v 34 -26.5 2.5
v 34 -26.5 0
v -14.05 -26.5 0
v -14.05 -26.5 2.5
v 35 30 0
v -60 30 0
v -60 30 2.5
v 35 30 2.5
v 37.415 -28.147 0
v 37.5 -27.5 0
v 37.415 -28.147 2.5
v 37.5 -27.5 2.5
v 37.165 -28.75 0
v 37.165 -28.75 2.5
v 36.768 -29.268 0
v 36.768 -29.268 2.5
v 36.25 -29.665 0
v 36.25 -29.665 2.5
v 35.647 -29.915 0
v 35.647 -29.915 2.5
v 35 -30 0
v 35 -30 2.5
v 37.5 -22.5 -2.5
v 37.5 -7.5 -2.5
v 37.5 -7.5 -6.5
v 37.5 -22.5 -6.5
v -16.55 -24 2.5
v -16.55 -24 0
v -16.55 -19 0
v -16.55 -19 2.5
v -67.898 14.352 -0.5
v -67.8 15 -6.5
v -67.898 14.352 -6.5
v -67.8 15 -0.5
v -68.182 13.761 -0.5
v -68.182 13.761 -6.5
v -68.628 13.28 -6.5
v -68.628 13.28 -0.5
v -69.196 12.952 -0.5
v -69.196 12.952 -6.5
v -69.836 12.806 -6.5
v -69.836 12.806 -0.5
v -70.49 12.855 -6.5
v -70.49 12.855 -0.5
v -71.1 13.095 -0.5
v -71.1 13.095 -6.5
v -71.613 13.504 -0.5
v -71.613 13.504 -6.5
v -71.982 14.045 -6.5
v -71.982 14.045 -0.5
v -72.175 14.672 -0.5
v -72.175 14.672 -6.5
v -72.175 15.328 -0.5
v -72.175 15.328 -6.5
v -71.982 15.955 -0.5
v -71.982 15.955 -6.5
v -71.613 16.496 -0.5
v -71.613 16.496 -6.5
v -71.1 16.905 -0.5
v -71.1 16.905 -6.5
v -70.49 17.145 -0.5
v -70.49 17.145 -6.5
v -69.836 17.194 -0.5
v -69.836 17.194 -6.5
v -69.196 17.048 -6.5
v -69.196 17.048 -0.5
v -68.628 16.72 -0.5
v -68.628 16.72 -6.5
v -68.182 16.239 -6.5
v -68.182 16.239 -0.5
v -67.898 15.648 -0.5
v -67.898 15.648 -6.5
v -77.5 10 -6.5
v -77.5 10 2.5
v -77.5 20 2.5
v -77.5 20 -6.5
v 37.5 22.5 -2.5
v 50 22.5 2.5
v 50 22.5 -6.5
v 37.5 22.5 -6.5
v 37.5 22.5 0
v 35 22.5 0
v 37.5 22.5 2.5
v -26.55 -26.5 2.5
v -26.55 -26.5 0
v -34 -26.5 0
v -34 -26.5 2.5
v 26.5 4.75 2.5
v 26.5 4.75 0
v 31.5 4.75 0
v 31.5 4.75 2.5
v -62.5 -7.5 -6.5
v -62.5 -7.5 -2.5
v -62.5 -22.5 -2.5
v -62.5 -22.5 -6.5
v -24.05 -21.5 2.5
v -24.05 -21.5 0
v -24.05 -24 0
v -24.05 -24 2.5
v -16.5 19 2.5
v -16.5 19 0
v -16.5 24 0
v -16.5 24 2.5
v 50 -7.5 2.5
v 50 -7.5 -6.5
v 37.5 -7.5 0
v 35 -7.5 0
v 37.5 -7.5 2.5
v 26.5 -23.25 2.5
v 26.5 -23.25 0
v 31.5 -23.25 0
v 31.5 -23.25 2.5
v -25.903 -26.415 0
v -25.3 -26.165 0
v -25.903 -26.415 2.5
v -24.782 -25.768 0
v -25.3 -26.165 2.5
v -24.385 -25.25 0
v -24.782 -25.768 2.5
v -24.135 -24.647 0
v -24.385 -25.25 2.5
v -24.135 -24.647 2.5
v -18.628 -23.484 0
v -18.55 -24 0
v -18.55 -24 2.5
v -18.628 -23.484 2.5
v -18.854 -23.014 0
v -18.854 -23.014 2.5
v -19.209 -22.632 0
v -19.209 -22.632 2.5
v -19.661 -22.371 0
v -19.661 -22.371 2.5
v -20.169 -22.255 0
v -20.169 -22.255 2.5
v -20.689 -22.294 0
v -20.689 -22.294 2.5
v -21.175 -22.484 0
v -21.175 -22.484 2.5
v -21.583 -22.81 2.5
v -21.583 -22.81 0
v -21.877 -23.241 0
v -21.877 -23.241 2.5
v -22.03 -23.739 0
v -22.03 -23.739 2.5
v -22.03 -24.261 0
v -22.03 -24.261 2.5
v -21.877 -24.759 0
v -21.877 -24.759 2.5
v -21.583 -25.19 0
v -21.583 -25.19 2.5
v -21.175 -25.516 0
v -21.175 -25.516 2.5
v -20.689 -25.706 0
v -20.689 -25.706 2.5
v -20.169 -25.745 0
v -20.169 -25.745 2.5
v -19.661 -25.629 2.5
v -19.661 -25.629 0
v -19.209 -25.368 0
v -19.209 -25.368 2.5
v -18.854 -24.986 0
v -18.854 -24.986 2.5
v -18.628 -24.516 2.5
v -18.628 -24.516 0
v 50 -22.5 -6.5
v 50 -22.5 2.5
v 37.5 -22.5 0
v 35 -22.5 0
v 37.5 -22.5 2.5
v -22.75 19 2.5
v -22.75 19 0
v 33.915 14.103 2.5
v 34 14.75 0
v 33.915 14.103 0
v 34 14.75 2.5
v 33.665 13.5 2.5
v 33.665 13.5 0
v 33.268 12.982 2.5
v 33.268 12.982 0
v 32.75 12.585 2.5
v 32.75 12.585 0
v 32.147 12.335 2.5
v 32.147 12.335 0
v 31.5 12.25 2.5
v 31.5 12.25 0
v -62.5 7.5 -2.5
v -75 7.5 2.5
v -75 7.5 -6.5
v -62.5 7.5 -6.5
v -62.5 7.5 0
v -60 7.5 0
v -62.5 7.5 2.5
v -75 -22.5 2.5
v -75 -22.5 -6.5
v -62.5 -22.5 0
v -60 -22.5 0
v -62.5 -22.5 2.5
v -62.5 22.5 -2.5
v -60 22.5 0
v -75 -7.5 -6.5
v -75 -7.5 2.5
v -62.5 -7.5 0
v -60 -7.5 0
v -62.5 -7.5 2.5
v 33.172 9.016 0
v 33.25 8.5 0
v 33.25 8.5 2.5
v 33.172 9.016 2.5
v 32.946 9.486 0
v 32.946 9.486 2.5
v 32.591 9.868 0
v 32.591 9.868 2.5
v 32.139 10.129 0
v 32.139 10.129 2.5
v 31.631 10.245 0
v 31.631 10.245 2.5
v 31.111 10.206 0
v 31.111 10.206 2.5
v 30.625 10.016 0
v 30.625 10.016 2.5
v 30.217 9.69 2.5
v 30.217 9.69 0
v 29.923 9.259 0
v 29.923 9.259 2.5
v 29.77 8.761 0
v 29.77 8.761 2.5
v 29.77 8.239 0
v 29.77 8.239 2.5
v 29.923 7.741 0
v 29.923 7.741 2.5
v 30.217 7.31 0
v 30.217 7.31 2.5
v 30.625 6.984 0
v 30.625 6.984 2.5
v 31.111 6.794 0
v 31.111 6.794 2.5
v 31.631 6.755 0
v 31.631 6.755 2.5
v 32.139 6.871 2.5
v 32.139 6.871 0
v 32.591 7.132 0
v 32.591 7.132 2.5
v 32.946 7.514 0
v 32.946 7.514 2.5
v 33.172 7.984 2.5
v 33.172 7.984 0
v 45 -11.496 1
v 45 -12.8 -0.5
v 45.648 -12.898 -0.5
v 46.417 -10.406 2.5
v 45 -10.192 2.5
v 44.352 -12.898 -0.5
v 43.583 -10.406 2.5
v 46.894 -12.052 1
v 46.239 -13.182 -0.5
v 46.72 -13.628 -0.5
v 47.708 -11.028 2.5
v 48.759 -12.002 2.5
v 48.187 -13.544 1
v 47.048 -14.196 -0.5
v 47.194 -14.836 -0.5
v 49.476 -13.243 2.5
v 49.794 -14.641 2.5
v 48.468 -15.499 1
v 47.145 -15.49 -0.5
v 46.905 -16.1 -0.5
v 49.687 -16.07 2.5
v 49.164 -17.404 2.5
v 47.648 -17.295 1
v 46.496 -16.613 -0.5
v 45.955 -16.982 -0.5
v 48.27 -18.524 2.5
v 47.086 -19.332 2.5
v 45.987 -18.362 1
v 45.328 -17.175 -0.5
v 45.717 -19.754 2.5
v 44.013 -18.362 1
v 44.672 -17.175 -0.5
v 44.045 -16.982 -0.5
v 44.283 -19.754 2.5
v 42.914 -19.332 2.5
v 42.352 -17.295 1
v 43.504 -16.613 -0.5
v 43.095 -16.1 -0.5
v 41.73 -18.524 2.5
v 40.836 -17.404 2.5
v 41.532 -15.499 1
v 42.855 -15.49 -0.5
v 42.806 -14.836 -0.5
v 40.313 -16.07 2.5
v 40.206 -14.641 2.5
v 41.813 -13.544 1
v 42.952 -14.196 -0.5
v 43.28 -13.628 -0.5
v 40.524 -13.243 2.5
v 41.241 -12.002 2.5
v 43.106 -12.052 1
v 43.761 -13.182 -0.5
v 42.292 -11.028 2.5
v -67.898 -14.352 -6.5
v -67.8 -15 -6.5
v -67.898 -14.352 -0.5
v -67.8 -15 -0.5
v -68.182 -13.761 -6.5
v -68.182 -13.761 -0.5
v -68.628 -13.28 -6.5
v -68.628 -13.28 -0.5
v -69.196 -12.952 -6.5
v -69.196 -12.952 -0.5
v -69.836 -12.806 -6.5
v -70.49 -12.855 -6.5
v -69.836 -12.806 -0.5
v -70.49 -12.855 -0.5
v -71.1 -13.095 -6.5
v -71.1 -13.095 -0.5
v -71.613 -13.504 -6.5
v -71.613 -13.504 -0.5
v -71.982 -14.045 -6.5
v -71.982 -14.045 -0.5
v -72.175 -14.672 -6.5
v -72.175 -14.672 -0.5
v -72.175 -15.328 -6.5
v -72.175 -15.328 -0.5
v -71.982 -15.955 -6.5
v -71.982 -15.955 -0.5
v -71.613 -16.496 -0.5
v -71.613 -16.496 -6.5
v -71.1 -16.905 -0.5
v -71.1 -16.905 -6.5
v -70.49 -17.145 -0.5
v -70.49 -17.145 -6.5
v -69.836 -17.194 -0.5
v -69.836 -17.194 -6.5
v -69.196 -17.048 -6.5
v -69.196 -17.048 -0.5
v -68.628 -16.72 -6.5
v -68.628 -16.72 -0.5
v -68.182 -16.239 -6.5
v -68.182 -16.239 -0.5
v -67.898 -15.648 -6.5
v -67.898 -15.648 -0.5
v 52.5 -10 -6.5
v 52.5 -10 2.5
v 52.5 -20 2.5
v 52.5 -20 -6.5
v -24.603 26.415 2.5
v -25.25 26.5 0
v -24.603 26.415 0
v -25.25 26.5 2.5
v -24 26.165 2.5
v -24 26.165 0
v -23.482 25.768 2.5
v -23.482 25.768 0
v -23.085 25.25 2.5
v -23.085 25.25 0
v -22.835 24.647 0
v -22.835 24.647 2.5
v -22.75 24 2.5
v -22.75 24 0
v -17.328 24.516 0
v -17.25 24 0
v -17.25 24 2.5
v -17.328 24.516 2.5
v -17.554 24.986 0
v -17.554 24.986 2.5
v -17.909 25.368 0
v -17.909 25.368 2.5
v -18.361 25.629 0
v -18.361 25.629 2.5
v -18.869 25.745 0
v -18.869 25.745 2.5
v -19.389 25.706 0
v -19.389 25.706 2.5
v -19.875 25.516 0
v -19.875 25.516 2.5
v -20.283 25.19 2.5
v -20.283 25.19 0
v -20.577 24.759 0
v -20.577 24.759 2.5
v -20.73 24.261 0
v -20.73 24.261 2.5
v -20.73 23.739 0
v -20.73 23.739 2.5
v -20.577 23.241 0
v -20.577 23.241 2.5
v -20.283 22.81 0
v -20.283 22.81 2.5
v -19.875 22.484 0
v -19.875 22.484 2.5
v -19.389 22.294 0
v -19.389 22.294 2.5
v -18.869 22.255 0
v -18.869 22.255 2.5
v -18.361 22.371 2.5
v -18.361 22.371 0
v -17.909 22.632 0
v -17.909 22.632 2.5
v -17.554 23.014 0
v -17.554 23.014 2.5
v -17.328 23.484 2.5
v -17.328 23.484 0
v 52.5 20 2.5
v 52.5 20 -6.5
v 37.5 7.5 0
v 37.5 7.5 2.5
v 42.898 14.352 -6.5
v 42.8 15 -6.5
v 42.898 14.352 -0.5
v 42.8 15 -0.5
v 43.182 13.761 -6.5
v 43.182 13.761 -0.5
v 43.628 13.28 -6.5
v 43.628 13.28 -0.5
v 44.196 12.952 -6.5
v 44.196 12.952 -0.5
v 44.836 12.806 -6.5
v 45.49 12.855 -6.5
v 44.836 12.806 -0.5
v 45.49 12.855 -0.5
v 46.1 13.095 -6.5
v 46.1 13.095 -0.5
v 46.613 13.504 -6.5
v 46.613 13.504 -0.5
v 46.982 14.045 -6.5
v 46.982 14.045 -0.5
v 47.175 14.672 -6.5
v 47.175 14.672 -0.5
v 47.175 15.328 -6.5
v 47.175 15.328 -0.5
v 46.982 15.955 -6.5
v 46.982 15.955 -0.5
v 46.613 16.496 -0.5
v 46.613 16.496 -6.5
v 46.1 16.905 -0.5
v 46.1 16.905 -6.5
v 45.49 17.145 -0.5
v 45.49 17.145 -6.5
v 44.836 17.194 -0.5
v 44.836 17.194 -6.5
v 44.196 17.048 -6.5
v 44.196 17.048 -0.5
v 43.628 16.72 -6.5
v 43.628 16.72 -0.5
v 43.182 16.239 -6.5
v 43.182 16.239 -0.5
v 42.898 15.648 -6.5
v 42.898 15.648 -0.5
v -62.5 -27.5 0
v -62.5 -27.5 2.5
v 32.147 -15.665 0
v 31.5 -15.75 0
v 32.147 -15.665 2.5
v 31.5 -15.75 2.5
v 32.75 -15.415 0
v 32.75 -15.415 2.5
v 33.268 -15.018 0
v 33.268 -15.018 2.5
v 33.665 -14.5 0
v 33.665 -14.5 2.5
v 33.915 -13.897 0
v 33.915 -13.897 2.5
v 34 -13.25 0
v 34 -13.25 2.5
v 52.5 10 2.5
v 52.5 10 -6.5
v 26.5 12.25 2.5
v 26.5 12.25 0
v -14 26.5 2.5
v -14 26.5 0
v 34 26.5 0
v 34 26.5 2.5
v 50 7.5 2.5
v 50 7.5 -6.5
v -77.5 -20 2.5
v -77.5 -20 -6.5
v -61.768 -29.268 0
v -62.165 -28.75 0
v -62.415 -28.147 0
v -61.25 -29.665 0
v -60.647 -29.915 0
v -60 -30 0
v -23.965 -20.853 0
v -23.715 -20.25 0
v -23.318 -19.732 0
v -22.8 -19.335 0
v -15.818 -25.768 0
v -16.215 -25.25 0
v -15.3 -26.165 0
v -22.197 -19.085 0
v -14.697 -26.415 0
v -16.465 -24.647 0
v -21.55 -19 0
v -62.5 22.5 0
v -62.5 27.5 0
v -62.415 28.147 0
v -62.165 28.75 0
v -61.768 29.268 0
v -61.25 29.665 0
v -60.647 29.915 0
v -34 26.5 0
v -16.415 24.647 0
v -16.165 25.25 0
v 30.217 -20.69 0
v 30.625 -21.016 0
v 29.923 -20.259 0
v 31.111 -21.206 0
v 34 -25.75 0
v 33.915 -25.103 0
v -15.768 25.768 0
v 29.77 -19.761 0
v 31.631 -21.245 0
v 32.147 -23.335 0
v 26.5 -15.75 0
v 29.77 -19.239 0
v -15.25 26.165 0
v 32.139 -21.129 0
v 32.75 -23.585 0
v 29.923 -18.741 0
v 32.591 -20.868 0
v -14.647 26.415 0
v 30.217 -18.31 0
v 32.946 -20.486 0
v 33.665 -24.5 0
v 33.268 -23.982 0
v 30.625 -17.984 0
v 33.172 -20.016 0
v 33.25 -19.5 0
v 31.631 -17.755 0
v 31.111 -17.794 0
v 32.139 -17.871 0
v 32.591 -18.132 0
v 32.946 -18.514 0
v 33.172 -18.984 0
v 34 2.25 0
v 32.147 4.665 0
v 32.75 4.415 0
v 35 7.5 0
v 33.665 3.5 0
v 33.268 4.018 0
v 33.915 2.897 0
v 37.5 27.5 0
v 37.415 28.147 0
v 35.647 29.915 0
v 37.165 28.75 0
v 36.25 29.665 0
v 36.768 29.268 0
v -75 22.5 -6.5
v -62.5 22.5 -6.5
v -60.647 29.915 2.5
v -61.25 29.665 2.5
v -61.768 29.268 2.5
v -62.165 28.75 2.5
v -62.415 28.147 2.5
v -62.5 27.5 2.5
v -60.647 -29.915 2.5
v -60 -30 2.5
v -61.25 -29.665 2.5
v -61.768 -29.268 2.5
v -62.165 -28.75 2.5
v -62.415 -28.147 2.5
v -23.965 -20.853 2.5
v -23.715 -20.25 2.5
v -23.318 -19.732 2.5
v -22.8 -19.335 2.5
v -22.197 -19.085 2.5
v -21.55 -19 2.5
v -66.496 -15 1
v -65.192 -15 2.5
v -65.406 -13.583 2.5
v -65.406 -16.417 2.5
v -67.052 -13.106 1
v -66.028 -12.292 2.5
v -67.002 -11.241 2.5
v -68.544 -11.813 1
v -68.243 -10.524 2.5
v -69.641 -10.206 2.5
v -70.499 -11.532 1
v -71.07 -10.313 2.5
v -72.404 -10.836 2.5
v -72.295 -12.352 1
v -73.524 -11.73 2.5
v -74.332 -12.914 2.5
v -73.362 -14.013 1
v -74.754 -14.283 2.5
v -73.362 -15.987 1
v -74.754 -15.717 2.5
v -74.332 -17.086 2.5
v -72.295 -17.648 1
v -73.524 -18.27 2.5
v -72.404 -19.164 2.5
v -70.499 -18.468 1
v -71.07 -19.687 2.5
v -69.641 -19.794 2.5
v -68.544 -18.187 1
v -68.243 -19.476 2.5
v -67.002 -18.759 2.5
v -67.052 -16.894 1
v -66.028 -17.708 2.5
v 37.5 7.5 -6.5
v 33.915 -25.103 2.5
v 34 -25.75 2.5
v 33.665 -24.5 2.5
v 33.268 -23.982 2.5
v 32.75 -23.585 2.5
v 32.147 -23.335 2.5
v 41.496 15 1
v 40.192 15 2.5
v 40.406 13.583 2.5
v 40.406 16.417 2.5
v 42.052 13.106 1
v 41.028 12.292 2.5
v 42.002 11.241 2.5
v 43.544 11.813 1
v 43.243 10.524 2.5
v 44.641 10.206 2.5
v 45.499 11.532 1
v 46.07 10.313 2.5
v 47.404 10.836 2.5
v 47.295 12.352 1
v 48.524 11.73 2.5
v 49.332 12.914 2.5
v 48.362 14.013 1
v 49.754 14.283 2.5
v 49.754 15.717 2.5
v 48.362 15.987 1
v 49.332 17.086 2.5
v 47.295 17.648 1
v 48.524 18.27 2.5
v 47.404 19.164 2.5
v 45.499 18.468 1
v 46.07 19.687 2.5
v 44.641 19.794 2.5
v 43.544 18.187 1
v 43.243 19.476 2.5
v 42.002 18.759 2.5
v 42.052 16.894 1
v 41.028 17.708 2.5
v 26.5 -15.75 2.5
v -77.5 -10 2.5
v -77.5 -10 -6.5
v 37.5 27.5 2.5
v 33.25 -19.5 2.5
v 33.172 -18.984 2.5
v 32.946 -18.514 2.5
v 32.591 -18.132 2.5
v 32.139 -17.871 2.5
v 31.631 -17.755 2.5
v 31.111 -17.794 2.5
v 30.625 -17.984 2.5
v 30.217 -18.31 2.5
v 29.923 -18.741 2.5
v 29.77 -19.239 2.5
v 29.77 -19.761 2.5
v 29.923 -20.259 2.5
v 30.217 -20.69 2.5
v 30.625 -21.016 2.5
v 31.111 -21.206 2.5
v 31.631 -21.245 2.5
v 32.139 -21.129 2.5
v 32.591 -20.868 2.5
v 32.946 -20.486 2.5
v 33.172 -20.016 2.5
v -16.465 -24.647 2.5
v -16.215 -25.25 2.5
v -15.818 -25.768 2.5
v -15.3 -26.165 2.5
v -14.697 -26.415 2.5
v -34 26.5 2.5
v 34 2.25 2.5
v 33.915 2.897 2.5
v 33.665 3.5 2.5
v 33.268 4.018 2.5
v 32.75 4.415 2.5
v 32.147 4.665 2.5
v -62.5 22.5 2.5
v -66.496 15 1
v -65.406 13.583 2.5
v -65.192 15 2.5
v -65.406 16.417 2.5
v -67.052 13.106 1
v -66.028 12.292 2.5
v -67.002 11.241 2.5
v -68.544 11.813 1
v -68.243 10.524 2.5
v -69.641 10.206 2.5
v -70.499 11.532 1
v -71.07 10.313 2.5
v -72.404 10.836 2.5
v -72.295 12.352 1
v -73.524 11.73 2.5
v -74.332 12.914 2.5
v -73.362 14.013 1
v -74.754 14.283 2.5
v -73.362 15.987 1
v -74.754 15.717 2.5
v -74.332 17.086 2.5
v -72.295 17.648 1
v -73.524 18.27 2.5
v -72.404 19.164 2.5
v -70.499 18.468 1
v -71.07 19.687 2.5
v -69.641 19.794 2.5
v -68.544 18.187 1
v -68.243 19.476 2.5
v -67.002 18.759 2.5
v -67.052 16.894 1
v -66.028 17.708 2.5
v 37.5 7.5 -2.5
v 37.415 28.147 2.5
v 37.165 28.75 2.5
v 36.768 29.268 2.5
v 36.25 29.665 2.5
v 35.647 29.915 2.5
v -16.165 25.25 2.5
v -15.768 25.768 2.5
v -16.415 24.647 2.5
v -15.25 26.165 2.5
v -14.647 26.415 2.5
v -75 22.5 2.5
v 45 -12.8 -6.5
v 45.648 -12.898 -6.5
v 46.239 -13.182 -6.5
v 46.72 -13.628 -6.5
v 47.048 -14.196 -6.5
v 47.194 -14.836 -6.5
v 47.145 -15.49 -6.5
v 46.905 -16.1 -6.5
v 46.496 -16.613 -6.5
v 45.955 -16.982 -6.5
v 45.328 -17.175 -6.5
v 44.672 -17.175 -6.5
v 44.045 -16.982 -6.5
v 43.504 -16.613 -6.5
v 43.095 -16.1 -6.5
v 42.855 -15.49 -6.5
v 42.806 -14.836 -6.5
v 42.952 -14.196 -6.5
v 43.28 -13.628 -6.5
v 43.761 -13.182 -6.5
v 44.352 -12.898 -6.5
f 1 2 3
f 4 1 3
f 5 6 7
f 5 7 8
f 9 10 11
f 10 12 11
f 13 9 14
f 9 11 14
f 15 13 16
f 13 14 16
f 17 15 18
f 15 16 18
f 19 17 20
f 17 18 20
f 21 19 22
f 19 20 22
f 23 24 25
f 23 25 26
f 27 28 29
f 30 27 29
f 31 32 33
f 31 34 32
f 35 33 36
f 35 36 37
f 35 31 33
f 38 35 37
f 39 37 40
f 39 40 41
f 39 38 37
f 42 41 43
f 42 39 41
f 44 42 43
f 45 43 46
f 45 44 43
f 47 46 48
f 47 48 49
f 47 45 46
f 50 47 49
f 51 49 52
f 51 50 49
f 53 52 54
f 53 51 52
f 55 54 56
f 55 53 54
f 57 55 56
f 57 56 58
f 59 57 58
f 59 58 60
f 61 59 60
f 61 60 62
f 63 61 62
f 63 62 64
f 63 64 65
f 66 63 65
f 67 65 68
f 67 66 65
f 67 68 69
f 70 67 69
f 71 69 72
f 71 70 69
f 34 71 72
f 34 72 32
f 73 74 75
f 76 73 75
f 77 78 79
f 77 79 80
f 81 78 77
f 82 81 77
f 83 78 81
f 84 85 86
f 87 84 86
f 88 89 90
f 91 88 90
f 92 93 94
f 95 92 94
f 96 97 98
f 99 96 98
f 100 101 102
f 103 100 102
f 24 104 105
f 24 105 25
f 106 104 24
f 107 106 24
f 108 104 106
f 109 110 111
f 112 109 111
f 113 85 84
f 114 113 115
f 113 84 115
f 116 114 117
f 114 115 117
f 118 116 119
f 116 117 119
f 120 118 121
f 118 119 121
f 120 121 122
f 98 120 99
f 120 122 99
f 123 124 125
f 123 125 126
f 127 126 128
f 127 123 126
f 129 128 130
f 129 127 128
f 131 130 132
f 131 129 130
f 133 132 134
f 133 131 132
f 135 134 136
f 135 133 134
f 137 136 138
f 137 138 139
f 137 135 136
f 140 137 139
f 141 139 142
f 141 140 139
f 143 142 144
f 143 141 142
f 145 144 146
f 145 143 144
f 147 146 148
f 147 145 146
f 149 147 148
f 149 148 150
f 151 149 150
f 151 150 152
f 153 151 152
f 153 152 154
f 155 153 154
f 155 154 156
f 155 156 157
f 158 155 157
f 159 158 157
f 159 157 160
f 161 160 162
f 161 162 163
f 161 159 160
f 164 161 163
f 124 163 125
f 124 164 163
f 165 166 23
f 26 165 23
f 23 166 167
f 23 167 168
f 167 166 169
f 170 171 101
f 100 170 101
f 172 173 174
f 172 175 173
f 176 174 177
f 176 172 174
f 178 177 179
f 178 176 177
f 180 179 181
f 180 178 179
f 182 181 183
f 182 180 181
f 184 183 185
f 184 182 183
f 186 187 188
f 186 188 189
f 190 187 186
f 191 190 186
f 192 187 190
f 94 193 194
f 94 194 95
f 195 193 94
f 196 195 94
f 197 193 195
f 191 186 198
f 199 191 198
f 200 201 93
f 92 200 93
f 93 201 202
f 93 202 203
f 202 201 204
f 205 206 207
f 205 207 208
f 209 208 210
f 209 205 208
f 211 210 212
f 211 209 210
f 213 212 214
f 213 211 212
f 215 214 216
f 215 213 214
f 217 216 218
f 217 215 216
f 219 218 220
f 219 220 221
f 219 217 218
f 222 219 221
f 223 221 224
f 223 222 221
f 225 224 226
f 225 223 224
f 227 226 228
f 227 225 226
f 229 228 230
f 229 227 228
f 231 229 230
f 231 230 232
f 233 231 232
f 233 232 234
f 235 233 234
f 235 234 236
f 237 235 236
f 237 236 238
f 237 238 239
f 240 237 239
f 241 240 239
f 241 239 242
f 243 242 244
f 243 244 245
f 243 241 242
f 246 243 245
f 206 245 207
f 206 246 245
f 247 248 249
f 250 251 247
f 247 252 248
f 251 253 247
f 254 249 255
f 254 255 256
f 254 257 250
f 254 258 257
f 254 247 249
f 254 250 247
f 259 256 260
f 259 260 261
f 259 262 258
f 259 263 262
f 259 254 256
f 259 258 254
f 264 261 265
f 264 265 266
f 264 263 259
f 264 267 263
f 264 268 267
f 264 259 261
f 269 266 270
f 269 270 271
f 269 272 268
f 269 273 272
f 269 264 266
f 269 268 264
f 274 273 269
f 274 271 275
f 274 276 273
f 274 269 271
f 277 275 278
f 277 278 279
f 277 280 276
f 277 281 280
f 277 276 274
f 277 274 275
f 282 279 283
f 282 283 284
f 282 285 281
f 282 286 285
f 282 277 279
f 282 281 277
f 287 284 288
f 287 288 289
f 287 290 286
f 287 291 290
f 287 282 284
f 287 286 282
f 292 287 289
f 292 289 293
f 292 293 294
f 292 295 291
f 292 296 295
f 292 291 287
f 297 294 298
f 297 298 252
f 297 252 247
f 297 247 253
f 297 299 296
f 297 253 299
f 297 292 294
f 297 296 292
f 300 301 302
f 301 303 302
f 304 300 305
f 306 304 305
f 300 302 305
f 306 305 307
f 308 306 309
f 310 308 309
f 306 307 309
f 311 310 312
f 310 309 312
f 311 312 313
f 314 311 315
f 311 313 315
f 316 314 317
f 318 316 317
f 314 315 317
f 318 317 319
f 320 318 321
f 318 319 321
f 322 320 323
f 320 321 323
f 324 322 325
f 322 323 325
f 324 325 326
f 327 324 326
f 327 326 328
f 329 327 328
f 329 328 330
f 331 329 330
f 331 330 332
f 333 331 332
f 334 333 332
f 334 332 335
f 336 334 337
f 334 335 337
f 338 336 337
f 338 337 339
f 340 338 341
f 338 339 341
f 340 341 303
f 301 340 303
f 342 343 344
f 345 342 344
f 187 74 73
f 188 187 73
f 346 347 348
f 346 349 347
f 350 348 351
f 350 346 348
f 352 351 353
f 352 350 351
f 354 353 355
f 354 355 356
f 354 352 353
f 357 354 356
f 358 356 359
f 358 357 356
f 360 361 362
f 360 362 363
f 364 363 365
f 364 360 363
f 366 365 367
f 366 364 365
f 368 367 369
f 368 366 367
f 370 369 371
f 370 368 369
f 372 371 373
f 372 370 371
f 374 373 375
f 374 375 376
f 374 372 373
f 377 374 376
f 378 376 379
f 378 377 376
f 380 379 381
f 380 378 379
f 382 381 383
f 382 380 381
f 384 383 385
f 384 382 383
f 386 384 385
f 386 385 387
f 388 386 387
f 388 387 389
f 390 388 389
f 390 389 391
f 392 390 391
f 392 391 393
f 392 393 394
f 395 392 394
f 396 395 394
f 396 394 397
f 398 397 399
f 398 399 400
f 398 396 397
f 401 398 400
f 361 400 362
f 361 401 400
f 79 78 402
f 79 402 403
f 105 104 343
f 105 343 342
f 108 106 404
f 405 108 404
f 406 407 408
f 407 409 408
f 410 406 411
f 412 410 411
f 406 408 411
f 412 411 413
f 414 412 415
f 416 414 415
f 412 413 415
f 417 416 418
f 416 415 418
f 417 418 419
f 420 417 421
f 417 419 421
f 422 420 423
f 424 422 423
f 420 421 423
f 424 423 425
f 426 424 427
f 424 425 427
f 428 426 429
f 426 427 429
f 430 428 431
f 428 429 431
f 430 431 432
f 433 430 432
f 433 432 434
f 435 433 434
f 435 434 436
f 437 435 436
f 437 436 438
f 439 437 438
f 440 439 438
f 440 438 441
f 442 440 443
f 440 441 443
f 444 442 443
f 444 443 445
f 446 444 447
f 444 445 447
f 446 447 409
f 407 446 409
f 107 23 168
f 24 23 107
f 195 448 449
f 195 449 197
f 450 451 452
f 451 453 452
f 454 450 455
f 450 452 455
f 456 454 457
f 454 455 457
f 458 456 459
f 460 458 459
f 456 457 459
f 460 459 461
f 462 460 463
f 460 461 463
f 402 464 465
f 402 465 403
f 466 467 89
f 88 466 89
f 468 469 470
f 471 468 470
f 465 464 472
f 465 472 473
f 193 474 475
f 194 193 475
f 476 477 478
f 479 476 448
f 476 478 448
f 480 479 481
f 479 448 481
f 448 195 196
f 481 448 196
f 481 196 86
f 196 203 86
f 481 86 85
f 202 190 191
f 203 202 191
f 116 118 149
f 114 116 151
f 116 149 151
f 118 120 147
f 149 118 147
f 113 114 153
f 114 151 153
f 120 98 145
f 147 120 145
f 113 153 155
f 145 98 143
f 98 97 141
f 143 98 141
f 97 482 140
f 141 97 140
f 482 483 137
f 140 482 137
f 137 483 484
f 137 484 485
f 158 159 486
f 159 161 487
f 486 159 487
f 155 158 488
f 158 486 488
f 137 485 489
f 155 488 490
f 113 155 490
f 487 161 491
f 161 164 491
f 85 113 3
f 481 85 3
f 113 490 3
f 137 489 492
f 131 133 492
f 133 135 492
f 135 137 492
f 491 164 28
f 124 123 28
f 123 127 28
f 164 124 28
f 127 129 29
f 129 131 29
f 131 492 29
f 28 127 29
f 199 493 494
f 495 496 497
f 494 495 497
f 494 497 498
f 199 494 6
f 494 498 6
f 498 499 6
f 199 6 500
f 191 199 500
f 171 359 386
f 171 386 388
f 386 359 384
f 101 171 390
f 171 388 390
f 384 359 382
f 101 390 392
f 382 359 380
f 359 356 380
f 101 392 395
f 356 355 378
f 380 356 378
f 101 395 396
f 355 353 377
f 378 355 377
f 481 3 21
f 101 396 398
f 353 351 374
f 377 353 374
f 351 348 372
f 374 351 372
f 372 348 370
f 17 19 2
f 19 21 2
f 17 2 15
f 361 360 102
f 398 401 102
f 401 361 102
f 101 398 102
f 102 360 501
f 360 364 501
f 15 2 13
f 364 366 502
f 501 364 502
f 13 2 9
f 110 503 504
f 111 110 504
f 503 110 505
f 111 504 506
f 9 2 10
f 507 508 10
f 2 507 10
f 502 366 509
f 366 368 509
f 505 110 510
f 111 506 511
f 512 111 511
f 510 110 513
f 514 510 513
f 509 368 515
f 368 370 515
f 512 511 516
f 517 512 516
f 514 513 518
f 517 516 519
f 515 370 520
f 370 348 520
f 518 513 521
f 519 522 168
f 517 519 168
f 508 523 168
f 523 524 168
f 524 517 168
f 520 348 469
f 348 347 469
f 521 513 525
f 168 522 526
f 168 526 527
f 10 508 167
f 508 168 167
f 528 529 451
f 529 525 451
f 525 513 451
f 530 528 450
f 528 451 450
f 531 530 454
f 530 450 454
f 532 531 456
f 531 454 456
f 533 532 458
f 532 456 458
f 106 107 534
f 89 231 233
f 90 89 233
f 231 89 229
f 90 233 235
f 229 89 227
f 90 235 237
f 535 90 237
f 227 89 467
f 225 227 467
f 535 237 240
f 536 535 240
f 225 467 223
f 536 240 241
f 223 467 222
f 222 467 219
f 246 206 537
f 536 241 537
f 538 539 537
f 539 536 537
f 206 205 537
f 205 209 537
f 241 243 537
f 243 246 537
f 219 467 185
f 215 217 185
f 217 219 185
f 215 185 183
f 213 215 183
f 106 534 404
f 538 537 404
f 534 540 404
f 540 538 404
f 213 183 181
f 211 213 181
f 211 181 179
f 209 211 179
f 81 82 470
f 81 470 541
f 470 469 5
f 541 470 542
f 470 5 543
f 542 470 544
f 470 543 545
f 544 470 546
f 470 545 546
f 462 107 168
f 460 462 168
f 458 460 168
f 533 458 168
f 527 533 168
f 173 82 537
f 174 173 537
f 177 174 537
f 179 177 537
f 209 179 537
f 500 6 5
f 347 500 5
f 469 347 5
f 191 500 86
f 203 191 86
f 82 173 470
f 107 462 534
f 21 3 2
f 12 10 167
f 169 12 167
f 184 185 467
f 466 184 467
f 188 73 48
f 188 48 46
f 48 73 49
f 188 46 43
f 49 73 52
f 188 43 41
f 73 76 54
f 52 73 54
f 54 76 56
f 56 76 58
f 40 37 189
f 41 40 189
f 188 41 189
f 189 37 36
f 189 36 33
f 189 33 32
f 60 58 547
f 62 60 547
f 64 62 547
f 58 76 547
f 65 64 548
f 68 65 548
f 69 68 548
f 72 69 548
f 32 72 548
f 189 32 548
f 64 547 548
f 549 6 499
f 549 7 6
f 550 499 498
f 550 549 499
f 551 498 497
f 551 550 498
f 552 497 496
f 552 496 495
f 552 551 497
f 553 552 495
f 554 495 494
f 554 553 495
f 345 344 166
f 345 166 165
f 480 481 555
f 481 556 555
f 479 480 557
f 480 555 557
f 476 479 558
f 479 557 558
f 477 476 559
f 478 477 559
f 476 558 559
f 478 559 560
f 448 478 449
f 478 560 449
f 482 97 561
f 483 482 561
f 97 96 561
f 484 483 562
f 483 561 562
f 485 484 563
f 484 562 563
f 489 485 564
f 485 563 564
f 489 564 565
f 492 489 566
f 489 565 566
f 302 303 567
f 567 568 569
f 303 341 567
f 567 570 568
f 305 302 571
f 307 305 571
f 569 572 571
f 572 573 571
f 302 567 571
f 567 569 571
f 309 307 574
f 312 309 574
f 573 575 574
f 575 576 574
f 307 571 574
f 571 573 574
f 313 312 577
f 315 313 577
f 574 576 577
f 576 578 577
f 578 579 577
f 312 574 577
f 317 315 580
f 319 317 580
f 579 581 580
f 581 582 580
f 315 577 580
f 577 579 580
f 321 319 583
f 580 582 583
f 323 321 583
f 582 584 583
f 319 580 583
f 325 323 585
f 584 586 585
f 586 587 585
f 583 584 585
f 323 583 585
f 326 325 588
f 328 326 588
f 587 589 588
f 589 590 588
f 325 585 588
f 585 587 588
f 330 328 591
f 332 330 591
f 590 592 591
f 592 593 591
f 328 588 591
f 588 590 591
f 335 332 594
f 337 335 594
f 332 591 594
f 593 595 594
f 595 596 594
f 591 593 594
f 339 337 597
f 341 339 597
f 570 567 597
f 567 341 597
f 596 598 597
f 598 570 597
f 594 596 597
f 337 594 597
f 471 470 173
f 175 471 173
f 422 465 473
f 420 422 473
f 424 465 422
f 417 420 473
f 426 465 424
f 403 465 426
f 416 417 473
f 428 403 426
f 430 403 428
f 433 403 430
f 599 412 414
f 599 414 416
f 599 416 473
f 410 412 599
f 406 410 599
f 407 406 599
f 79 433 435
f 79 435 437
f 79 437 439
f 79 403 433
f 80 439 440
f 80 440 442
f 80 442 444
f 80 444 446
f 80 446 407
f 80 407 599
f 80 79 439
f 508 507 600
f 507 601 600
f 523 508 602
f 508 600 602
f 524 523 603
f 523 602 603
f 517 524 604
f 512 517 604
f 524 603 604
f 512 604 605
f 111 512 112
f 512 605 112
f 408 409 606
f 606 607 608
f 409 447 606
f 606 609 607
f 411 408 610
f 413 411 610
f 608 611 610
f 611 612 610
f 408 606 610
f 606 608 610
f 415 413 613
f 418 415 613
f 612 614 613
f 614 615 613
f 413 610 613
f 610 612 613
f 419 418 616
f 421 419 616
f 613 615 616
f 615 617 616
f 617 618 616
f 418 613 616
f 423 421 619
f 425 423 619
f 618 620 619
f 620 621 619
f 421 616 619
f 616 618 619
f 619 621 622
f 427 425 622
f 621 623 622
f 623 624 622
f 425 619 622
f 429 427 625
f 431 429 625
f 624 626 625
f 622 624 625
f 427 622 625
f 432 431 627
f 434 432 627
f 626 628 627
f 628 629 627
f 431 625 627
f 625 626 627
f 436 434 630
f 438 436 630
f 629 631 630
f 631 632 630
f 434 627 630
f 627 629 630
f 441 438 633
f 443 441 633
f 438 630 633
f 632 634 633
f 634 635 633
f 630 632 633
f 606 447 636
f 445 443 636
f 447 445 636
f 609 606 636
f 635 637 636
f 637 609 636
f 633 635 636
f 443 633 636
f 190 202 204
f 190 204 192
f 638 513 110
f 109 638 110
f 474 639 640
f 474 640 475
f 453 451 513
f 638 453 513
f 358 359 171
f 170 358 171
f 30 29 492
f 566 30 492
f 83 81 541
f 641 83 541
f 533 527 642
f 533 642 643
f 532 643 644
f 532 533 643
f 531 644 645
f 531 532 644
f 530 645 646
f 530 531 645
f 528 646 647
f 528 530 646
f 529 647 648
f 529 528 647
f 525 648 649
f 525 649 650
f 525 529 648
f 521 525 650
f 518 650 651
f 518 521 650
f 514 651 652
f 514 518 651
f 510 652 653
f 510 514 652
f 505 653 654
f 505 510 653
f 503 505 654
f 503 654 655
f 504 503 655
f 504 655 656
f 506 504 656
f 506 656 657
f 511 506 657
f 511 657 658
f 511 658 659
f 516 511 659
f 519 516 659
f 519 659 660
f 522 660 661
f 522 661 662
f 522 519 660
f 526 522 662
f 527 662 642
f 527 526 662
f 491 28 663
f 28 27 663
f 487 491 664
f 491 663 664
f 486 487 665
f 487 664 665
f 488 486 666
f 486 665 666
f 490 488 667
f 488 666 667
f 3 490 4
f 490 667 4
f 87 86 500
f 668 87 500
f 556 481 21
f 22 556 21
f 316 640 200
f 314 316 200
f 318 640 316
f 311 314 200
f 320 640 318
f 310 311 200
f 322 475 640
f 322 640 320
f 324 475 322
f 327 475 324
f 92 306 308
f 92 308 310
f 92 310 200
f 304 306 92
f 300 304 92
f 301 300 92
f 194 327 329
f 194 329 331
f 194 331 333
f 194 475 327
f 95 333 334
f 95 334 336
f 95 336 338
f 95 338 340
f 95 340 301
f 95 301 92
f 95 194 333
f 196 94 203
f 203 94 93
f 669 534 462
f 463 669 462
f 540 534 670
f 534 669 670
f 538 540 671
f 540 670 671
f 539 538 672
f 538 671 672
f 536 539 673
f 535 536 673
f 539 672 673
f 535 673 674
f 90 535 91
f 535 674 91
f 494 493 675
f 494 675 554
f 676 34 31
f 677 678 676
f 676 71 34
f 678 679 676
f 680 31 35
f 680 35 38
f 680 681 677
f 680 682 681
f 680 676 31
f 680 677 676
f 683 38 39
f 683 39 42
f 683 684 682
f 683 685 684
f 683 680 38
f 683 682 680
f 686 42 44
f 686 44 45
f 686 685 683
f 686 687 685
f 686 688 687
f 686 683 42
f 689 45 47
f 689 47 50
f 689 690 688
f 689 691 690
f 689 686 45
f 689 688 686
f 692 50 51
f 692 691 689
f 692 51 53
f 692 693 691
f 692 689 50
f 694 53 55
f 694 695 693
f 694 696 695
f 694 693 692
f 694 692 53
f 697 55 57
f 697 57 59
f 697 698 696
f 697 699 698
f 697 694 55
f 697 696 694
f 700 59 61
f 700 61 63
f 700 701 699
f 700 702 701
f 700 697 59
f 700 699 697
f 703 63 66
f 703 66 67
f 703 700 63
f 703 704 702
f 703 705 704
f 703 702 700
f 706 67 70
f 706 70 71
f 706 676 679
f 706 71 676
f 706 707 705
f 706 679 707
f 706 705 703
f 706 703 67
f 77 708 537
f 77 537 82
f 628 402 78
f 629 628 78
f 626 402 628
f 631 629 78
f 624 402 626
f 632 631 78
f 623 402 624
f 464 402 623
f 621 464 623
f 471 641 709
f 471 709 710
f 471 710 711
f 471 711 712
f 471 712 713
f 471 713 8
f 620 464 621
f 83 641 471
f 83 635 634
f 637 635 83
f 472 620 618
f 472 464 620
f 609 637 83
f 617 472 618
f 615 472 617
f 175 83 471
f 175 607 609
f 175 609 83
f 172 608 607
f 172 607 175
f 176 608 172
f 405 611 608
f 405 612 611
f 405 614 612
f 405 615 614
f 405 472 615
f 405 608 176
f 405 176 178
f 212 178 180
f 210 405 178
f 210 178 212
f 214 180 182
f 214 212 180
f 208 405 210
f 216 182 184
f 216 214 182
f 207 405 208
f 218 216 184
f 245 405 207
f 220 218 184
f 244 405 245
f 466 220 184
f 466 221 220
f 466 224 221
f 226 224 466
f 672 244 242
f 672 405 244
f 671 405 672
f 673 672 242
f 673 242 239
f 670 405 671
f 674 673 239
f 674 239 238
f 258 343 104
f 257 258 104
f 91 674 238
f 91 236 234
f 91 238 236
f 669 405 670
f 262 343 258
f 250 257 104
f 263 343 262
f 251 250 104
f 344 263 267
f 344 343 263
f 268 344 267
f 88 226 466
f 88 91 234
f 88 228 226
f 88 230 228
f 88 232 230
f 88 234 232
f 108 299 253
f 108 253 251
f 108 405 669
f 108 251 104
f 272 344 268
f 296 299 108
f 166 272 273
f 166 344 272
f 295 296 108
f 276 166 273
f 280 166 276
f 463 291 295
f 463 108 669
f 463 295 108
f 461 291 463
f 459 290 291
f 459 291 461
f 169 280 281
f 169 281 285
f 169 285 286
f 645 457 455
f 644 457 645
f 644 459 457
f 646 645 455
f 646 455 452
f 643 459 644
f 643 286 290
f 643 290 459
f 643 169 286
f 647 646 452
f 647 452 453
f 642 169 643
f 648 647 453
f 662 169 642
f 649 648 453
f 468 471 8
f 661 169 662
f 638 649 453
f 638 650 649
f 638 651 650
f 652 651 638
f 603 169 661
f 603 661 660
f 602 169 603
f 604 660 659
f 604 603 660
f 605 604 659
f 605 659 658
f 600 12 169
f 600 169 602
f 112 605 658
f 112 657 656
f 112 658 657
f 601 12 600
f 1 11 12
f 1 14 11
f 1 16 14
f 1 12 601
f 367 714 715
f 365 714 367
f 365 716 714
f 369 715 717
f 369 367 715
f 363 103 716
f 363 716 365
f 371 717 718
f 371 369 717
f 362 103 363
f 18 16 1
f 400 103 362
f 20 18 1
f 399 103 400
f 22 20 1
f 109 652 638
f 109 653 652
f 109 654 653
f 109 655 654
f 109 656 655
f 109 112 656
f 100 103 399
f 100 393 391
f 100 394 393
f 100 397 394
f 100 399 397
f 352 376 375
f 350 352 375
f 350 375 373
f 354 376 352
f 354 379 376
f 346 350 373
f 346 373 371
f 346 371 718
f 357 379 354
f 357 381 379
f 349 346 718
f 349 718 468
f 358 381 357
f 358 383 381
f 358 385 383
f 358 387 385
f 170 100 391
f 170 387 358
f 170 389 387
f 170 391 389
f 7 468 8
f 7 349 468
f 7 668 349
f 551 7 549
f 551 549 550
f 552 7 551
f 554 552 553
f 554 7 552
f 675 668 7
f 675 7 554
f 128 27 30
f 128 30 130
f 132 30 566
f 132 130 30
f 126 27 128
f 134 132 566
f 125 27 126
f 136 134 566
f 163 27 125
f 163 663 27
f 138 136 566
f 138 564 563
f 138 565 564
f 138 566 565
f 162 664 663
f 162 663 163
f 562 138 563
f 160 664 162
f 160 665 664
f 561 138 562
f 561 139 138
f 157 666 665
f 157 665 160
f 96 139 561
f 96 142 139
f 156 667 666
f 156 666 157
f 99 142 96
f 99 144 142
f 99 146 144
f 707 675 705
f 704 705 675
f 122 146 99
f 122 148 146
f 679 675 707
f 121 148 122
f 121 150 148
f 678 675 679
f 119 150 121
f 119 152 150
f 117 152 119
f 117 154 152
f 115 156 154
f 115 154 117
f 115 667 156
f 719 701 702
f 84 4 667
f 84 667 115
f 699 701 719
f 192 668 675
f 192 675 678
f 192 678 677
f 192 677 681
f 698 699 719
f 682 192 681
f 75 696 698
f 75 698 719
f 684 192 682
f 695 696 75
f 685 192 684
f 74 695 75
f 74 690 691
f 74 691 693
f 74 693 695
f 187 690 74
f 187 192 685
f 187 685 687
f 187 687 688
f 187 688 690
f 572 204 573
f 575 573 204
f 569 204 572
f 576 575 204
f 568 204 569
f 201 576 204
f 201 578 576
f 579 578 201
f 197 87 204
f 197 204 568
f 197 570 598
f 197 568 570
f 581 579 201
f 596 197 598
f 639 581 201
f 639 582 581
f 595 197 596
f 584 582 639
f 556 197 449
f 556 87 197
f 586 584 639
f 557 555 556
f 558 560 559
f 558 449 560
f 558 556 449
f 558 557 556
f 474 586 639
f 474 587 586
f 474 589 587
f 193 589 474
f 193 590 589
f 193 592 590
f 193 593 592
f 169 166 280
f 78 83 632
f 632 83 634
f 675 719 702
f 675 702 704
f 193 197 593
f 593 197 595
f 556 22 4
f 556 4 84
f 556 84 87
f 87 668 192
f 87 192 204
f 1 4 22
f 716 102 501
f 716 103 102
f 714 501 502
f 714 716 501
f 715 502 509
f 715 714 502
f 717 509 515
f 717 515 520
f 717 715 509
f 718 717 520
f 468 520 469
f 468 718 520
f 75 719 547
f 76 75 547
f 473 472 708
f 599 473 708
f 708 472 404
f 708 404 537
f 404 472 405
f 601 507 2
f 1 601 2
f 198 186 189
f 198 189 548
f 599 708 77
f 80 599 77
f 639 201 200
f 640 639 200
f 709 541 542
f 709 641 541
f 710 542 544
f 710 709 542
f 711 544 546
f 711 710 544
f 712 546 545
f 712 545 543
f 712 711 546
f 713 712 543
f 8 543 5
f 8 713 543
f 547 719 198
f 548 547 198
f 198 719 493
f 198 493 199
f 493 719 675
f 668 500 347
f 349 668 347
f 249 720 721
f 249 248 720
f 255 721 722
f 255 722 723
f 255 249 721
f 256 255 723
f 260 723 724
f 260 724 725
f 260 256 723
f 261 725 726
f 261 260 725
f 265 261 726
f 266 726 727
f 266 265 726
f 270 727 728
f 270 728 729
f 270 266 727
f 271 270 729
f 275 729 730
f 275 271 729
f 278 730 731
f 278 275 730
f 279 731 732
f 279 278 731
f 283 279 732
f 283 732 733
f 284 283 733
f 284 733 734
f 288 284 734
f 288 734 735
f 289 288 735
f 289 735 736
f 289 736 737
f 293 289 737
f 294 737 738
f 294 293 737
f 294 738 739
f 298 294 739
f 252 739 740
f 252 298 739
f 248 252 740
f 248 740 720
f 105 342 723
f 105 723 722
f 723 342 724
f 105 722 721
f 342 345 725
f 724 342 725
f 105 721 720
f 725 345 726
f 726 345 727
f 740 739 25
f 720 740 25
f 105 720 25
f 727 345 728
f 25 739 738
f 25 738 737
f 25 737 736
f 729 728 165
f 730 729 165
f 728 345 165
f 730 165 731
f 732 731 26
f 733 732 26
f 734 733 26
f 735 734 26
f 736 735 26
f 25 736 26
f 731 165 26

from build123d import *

# Parameters (mm, degrees)
SKETCH1_W               = 100
SKETCH1_H               = 60
SKETCH1_R               = 1.75
BOSS_EXTRUDE1_DEPTH     = 2.5
SKETCH2_W               = 15
SKETCH2_H               = 15
BOSS_EXTRUDE2_DEPTH     = 9
MIRROR2_COPY_1_SKETCH_W = 15
MIRROR2_COPY_1_SKETCH_H = 15
MIRROR2_COPY_1_DEPTH    = 9
FILLET1_R               = 2.5
FILLET2_R               = 2.5
CHAMFER1_SIZE           = 2.5


with BuildPart() as part:
    # Sketch1 → Boss-Extrude1 (new body)
    with BuildSketch(Plane.XY):
        with Locations((-12.5, 0)):
            Rectangle(SKETCH1_W, SKETCH1_H)
        Polygon((-34, -26.5), (-34, 26.5), (-22.75, 26.5), (-22.75, 19), (-16.5, 19), (-16.5, 26.5), (34, 26.5), (34, 12.25), (26.5, 12.25), (26.5, 4.75), (34, 4.75), (34, -15.75), (26.5, -15.75), (26.5, -23.25), (34, -23.25), (34, -26.5), (-16.55, -26.5), (-16.55, -19), (-24.05, -19), (-24.05, -26.5), align=None, mode=Mode.SUBTRACT)
        with Locations((-19, 24)):
            Circle(SKETCH1_R, mode=Mode.SUBTRACT)
        with Locations((-20.3, -24)):
            Circle(SKETCH1_R, mode=Mode.SUBTRACT)
        with Locations((31.5, 8.5)):
            Circle(SKETCH1_R, mode=Mode.SUBTRACT)
        with Locations((31.5, -19.5)):
            Circle(SKETCH1_R, mode=Mode.SUBTRACT)
    extrude(amount=BOSS_EXTRUDE1_DEPTH)

    # Sketch2 → Boss-Extrude2 (add)
    with BuildSketch(Plane.XY.offset(2.5)):
        with Locations((-70, 15)):
            Rectangle(SKETCH2_W, SKETCH2_H)
    boss_extrude2 = extrude(amount=-BOSS_EXTRUDE2_DEPTH)

    # Sketch3 → Cut-Revolve1 (revolve, cut)
    with BuildSketch(Plane.ZY.offset(70), mode=Mode.PRIVATE) as cut_revolve1_sk:
        Polygon((2.5, 15), (-6.5, 15), (-6.5, 12.8), (-0.5, 12.8), (2.5, 10.192139787), align=None)
    cut_revolve1 = revolve(cut_revolve1_sk.sketch.rotate(Axis((-70, 15, 2.5), (0, 0, -1)), 270), axis=Axis((-70, 15, 2.5), (0, 0, -1)), mode=Mode.SUBTRACT)

    # Mirror1: Boss-Extrude2, Cut-Revolve1 across plane
    add(boss_extrude2.mirror(Plane.ZX))
    add(cut_revolve1.mirror(Plane.ZX), mode=Mode.SUBTRACT)

    # Mirror2: Boss-Extrude2, Cut-Revolve1 across plane
    add(boss_extrude2.mirror(Plane.ZY.offset(12.5)))
    add(cut_revolve1.mirror(Plane.ZY.offset(12.5)), mode=Mode.SUBTRACT)

    # Mirror2 copy 1 sketch → Mirror2 copy 1 (add)
    with BuildSketch(Plane(origin=(-25, 0, 2.5), x_dir=(-1, 0, 0), z_dir=(0, 0, 1))):
        with Locations((-70, 15)):
            Rectangle(MIRROR2_COPY_1_SKETCH_W, MIRROR2_COPY_1_SKETCH_H)
    extrude(amount=-MIRROR2_COPY_1_DEPTH)

    # Mirror2 copy 2 sketch → Mirror2 copy 2 (revolve, cut)
    with BuildSketch(Plane(origin=(45, 0, 0), x_dir=(0, 0, 1), z_dir=(1, 0, 0))):
        Polygon((2.5, 15), (-6.5, 15), (-6.5, 12.8), (-0.5, 12.8), (2.5, 10.192139787), align=None)
    revolve(axis=Axis((45, -15, 2.5), (0, 0, -1)), mode=Mode.SUBTRACT)

    # Fillet1
    fillet1_edges = [part.edges().sort_by_distance(p)[0] for p in [
        (-24.05, -26.5, 1.25),
        (-24.05, -19, 1.25),
        (-16.55, -26.5, 1.25),
        (34, -23.25, 1.25),
        (34, -15.75, 1.25),
        (34, 4.75, 1.25),
        (34, 12.25, 1.25),
        (-16.5, 26.5, 1.25),
        (-22.75, 26.5, 1.25),
    ]]
    fillet(fillet1_edges, radius=FILLET1_R)

    # Fillet2
    fillet2_edges = [part.edges().sort_by_distance(p)[0] for p in [
        (37.5, -30, 1.25),
        (-62.5, -30, 1.25),
        (-62.5, 30, 1.25),
        (37.5, 30, 1.25),
    ]]
    fillet(fillet2_edges, radius=FILLET2_R)

    # Chamfer1
    chamfer1_edges = [part.edges().sort_by_distance(p)[0] for p in [
        (-62.5, -15, 0),
        (-77.5, -22.5, -2),
        (-77.5, -7.5, -2),
        (37.5, -15, 0),
        (52.5, -7.5, -2),
        (52.5, -22.5, -2),
        (37.5, 15, 0),
        (52.5, 22.5, -2),
        (52.5, 7.5, -2),
        (-62.5, 15, 0),
        (-77.5, 7.5, -2),
        (-77.5, 22.5, -2),
    ]]
    chamfer(chamfer1_edges, length=CHAMFER1_SIZE)


solid = part.part
